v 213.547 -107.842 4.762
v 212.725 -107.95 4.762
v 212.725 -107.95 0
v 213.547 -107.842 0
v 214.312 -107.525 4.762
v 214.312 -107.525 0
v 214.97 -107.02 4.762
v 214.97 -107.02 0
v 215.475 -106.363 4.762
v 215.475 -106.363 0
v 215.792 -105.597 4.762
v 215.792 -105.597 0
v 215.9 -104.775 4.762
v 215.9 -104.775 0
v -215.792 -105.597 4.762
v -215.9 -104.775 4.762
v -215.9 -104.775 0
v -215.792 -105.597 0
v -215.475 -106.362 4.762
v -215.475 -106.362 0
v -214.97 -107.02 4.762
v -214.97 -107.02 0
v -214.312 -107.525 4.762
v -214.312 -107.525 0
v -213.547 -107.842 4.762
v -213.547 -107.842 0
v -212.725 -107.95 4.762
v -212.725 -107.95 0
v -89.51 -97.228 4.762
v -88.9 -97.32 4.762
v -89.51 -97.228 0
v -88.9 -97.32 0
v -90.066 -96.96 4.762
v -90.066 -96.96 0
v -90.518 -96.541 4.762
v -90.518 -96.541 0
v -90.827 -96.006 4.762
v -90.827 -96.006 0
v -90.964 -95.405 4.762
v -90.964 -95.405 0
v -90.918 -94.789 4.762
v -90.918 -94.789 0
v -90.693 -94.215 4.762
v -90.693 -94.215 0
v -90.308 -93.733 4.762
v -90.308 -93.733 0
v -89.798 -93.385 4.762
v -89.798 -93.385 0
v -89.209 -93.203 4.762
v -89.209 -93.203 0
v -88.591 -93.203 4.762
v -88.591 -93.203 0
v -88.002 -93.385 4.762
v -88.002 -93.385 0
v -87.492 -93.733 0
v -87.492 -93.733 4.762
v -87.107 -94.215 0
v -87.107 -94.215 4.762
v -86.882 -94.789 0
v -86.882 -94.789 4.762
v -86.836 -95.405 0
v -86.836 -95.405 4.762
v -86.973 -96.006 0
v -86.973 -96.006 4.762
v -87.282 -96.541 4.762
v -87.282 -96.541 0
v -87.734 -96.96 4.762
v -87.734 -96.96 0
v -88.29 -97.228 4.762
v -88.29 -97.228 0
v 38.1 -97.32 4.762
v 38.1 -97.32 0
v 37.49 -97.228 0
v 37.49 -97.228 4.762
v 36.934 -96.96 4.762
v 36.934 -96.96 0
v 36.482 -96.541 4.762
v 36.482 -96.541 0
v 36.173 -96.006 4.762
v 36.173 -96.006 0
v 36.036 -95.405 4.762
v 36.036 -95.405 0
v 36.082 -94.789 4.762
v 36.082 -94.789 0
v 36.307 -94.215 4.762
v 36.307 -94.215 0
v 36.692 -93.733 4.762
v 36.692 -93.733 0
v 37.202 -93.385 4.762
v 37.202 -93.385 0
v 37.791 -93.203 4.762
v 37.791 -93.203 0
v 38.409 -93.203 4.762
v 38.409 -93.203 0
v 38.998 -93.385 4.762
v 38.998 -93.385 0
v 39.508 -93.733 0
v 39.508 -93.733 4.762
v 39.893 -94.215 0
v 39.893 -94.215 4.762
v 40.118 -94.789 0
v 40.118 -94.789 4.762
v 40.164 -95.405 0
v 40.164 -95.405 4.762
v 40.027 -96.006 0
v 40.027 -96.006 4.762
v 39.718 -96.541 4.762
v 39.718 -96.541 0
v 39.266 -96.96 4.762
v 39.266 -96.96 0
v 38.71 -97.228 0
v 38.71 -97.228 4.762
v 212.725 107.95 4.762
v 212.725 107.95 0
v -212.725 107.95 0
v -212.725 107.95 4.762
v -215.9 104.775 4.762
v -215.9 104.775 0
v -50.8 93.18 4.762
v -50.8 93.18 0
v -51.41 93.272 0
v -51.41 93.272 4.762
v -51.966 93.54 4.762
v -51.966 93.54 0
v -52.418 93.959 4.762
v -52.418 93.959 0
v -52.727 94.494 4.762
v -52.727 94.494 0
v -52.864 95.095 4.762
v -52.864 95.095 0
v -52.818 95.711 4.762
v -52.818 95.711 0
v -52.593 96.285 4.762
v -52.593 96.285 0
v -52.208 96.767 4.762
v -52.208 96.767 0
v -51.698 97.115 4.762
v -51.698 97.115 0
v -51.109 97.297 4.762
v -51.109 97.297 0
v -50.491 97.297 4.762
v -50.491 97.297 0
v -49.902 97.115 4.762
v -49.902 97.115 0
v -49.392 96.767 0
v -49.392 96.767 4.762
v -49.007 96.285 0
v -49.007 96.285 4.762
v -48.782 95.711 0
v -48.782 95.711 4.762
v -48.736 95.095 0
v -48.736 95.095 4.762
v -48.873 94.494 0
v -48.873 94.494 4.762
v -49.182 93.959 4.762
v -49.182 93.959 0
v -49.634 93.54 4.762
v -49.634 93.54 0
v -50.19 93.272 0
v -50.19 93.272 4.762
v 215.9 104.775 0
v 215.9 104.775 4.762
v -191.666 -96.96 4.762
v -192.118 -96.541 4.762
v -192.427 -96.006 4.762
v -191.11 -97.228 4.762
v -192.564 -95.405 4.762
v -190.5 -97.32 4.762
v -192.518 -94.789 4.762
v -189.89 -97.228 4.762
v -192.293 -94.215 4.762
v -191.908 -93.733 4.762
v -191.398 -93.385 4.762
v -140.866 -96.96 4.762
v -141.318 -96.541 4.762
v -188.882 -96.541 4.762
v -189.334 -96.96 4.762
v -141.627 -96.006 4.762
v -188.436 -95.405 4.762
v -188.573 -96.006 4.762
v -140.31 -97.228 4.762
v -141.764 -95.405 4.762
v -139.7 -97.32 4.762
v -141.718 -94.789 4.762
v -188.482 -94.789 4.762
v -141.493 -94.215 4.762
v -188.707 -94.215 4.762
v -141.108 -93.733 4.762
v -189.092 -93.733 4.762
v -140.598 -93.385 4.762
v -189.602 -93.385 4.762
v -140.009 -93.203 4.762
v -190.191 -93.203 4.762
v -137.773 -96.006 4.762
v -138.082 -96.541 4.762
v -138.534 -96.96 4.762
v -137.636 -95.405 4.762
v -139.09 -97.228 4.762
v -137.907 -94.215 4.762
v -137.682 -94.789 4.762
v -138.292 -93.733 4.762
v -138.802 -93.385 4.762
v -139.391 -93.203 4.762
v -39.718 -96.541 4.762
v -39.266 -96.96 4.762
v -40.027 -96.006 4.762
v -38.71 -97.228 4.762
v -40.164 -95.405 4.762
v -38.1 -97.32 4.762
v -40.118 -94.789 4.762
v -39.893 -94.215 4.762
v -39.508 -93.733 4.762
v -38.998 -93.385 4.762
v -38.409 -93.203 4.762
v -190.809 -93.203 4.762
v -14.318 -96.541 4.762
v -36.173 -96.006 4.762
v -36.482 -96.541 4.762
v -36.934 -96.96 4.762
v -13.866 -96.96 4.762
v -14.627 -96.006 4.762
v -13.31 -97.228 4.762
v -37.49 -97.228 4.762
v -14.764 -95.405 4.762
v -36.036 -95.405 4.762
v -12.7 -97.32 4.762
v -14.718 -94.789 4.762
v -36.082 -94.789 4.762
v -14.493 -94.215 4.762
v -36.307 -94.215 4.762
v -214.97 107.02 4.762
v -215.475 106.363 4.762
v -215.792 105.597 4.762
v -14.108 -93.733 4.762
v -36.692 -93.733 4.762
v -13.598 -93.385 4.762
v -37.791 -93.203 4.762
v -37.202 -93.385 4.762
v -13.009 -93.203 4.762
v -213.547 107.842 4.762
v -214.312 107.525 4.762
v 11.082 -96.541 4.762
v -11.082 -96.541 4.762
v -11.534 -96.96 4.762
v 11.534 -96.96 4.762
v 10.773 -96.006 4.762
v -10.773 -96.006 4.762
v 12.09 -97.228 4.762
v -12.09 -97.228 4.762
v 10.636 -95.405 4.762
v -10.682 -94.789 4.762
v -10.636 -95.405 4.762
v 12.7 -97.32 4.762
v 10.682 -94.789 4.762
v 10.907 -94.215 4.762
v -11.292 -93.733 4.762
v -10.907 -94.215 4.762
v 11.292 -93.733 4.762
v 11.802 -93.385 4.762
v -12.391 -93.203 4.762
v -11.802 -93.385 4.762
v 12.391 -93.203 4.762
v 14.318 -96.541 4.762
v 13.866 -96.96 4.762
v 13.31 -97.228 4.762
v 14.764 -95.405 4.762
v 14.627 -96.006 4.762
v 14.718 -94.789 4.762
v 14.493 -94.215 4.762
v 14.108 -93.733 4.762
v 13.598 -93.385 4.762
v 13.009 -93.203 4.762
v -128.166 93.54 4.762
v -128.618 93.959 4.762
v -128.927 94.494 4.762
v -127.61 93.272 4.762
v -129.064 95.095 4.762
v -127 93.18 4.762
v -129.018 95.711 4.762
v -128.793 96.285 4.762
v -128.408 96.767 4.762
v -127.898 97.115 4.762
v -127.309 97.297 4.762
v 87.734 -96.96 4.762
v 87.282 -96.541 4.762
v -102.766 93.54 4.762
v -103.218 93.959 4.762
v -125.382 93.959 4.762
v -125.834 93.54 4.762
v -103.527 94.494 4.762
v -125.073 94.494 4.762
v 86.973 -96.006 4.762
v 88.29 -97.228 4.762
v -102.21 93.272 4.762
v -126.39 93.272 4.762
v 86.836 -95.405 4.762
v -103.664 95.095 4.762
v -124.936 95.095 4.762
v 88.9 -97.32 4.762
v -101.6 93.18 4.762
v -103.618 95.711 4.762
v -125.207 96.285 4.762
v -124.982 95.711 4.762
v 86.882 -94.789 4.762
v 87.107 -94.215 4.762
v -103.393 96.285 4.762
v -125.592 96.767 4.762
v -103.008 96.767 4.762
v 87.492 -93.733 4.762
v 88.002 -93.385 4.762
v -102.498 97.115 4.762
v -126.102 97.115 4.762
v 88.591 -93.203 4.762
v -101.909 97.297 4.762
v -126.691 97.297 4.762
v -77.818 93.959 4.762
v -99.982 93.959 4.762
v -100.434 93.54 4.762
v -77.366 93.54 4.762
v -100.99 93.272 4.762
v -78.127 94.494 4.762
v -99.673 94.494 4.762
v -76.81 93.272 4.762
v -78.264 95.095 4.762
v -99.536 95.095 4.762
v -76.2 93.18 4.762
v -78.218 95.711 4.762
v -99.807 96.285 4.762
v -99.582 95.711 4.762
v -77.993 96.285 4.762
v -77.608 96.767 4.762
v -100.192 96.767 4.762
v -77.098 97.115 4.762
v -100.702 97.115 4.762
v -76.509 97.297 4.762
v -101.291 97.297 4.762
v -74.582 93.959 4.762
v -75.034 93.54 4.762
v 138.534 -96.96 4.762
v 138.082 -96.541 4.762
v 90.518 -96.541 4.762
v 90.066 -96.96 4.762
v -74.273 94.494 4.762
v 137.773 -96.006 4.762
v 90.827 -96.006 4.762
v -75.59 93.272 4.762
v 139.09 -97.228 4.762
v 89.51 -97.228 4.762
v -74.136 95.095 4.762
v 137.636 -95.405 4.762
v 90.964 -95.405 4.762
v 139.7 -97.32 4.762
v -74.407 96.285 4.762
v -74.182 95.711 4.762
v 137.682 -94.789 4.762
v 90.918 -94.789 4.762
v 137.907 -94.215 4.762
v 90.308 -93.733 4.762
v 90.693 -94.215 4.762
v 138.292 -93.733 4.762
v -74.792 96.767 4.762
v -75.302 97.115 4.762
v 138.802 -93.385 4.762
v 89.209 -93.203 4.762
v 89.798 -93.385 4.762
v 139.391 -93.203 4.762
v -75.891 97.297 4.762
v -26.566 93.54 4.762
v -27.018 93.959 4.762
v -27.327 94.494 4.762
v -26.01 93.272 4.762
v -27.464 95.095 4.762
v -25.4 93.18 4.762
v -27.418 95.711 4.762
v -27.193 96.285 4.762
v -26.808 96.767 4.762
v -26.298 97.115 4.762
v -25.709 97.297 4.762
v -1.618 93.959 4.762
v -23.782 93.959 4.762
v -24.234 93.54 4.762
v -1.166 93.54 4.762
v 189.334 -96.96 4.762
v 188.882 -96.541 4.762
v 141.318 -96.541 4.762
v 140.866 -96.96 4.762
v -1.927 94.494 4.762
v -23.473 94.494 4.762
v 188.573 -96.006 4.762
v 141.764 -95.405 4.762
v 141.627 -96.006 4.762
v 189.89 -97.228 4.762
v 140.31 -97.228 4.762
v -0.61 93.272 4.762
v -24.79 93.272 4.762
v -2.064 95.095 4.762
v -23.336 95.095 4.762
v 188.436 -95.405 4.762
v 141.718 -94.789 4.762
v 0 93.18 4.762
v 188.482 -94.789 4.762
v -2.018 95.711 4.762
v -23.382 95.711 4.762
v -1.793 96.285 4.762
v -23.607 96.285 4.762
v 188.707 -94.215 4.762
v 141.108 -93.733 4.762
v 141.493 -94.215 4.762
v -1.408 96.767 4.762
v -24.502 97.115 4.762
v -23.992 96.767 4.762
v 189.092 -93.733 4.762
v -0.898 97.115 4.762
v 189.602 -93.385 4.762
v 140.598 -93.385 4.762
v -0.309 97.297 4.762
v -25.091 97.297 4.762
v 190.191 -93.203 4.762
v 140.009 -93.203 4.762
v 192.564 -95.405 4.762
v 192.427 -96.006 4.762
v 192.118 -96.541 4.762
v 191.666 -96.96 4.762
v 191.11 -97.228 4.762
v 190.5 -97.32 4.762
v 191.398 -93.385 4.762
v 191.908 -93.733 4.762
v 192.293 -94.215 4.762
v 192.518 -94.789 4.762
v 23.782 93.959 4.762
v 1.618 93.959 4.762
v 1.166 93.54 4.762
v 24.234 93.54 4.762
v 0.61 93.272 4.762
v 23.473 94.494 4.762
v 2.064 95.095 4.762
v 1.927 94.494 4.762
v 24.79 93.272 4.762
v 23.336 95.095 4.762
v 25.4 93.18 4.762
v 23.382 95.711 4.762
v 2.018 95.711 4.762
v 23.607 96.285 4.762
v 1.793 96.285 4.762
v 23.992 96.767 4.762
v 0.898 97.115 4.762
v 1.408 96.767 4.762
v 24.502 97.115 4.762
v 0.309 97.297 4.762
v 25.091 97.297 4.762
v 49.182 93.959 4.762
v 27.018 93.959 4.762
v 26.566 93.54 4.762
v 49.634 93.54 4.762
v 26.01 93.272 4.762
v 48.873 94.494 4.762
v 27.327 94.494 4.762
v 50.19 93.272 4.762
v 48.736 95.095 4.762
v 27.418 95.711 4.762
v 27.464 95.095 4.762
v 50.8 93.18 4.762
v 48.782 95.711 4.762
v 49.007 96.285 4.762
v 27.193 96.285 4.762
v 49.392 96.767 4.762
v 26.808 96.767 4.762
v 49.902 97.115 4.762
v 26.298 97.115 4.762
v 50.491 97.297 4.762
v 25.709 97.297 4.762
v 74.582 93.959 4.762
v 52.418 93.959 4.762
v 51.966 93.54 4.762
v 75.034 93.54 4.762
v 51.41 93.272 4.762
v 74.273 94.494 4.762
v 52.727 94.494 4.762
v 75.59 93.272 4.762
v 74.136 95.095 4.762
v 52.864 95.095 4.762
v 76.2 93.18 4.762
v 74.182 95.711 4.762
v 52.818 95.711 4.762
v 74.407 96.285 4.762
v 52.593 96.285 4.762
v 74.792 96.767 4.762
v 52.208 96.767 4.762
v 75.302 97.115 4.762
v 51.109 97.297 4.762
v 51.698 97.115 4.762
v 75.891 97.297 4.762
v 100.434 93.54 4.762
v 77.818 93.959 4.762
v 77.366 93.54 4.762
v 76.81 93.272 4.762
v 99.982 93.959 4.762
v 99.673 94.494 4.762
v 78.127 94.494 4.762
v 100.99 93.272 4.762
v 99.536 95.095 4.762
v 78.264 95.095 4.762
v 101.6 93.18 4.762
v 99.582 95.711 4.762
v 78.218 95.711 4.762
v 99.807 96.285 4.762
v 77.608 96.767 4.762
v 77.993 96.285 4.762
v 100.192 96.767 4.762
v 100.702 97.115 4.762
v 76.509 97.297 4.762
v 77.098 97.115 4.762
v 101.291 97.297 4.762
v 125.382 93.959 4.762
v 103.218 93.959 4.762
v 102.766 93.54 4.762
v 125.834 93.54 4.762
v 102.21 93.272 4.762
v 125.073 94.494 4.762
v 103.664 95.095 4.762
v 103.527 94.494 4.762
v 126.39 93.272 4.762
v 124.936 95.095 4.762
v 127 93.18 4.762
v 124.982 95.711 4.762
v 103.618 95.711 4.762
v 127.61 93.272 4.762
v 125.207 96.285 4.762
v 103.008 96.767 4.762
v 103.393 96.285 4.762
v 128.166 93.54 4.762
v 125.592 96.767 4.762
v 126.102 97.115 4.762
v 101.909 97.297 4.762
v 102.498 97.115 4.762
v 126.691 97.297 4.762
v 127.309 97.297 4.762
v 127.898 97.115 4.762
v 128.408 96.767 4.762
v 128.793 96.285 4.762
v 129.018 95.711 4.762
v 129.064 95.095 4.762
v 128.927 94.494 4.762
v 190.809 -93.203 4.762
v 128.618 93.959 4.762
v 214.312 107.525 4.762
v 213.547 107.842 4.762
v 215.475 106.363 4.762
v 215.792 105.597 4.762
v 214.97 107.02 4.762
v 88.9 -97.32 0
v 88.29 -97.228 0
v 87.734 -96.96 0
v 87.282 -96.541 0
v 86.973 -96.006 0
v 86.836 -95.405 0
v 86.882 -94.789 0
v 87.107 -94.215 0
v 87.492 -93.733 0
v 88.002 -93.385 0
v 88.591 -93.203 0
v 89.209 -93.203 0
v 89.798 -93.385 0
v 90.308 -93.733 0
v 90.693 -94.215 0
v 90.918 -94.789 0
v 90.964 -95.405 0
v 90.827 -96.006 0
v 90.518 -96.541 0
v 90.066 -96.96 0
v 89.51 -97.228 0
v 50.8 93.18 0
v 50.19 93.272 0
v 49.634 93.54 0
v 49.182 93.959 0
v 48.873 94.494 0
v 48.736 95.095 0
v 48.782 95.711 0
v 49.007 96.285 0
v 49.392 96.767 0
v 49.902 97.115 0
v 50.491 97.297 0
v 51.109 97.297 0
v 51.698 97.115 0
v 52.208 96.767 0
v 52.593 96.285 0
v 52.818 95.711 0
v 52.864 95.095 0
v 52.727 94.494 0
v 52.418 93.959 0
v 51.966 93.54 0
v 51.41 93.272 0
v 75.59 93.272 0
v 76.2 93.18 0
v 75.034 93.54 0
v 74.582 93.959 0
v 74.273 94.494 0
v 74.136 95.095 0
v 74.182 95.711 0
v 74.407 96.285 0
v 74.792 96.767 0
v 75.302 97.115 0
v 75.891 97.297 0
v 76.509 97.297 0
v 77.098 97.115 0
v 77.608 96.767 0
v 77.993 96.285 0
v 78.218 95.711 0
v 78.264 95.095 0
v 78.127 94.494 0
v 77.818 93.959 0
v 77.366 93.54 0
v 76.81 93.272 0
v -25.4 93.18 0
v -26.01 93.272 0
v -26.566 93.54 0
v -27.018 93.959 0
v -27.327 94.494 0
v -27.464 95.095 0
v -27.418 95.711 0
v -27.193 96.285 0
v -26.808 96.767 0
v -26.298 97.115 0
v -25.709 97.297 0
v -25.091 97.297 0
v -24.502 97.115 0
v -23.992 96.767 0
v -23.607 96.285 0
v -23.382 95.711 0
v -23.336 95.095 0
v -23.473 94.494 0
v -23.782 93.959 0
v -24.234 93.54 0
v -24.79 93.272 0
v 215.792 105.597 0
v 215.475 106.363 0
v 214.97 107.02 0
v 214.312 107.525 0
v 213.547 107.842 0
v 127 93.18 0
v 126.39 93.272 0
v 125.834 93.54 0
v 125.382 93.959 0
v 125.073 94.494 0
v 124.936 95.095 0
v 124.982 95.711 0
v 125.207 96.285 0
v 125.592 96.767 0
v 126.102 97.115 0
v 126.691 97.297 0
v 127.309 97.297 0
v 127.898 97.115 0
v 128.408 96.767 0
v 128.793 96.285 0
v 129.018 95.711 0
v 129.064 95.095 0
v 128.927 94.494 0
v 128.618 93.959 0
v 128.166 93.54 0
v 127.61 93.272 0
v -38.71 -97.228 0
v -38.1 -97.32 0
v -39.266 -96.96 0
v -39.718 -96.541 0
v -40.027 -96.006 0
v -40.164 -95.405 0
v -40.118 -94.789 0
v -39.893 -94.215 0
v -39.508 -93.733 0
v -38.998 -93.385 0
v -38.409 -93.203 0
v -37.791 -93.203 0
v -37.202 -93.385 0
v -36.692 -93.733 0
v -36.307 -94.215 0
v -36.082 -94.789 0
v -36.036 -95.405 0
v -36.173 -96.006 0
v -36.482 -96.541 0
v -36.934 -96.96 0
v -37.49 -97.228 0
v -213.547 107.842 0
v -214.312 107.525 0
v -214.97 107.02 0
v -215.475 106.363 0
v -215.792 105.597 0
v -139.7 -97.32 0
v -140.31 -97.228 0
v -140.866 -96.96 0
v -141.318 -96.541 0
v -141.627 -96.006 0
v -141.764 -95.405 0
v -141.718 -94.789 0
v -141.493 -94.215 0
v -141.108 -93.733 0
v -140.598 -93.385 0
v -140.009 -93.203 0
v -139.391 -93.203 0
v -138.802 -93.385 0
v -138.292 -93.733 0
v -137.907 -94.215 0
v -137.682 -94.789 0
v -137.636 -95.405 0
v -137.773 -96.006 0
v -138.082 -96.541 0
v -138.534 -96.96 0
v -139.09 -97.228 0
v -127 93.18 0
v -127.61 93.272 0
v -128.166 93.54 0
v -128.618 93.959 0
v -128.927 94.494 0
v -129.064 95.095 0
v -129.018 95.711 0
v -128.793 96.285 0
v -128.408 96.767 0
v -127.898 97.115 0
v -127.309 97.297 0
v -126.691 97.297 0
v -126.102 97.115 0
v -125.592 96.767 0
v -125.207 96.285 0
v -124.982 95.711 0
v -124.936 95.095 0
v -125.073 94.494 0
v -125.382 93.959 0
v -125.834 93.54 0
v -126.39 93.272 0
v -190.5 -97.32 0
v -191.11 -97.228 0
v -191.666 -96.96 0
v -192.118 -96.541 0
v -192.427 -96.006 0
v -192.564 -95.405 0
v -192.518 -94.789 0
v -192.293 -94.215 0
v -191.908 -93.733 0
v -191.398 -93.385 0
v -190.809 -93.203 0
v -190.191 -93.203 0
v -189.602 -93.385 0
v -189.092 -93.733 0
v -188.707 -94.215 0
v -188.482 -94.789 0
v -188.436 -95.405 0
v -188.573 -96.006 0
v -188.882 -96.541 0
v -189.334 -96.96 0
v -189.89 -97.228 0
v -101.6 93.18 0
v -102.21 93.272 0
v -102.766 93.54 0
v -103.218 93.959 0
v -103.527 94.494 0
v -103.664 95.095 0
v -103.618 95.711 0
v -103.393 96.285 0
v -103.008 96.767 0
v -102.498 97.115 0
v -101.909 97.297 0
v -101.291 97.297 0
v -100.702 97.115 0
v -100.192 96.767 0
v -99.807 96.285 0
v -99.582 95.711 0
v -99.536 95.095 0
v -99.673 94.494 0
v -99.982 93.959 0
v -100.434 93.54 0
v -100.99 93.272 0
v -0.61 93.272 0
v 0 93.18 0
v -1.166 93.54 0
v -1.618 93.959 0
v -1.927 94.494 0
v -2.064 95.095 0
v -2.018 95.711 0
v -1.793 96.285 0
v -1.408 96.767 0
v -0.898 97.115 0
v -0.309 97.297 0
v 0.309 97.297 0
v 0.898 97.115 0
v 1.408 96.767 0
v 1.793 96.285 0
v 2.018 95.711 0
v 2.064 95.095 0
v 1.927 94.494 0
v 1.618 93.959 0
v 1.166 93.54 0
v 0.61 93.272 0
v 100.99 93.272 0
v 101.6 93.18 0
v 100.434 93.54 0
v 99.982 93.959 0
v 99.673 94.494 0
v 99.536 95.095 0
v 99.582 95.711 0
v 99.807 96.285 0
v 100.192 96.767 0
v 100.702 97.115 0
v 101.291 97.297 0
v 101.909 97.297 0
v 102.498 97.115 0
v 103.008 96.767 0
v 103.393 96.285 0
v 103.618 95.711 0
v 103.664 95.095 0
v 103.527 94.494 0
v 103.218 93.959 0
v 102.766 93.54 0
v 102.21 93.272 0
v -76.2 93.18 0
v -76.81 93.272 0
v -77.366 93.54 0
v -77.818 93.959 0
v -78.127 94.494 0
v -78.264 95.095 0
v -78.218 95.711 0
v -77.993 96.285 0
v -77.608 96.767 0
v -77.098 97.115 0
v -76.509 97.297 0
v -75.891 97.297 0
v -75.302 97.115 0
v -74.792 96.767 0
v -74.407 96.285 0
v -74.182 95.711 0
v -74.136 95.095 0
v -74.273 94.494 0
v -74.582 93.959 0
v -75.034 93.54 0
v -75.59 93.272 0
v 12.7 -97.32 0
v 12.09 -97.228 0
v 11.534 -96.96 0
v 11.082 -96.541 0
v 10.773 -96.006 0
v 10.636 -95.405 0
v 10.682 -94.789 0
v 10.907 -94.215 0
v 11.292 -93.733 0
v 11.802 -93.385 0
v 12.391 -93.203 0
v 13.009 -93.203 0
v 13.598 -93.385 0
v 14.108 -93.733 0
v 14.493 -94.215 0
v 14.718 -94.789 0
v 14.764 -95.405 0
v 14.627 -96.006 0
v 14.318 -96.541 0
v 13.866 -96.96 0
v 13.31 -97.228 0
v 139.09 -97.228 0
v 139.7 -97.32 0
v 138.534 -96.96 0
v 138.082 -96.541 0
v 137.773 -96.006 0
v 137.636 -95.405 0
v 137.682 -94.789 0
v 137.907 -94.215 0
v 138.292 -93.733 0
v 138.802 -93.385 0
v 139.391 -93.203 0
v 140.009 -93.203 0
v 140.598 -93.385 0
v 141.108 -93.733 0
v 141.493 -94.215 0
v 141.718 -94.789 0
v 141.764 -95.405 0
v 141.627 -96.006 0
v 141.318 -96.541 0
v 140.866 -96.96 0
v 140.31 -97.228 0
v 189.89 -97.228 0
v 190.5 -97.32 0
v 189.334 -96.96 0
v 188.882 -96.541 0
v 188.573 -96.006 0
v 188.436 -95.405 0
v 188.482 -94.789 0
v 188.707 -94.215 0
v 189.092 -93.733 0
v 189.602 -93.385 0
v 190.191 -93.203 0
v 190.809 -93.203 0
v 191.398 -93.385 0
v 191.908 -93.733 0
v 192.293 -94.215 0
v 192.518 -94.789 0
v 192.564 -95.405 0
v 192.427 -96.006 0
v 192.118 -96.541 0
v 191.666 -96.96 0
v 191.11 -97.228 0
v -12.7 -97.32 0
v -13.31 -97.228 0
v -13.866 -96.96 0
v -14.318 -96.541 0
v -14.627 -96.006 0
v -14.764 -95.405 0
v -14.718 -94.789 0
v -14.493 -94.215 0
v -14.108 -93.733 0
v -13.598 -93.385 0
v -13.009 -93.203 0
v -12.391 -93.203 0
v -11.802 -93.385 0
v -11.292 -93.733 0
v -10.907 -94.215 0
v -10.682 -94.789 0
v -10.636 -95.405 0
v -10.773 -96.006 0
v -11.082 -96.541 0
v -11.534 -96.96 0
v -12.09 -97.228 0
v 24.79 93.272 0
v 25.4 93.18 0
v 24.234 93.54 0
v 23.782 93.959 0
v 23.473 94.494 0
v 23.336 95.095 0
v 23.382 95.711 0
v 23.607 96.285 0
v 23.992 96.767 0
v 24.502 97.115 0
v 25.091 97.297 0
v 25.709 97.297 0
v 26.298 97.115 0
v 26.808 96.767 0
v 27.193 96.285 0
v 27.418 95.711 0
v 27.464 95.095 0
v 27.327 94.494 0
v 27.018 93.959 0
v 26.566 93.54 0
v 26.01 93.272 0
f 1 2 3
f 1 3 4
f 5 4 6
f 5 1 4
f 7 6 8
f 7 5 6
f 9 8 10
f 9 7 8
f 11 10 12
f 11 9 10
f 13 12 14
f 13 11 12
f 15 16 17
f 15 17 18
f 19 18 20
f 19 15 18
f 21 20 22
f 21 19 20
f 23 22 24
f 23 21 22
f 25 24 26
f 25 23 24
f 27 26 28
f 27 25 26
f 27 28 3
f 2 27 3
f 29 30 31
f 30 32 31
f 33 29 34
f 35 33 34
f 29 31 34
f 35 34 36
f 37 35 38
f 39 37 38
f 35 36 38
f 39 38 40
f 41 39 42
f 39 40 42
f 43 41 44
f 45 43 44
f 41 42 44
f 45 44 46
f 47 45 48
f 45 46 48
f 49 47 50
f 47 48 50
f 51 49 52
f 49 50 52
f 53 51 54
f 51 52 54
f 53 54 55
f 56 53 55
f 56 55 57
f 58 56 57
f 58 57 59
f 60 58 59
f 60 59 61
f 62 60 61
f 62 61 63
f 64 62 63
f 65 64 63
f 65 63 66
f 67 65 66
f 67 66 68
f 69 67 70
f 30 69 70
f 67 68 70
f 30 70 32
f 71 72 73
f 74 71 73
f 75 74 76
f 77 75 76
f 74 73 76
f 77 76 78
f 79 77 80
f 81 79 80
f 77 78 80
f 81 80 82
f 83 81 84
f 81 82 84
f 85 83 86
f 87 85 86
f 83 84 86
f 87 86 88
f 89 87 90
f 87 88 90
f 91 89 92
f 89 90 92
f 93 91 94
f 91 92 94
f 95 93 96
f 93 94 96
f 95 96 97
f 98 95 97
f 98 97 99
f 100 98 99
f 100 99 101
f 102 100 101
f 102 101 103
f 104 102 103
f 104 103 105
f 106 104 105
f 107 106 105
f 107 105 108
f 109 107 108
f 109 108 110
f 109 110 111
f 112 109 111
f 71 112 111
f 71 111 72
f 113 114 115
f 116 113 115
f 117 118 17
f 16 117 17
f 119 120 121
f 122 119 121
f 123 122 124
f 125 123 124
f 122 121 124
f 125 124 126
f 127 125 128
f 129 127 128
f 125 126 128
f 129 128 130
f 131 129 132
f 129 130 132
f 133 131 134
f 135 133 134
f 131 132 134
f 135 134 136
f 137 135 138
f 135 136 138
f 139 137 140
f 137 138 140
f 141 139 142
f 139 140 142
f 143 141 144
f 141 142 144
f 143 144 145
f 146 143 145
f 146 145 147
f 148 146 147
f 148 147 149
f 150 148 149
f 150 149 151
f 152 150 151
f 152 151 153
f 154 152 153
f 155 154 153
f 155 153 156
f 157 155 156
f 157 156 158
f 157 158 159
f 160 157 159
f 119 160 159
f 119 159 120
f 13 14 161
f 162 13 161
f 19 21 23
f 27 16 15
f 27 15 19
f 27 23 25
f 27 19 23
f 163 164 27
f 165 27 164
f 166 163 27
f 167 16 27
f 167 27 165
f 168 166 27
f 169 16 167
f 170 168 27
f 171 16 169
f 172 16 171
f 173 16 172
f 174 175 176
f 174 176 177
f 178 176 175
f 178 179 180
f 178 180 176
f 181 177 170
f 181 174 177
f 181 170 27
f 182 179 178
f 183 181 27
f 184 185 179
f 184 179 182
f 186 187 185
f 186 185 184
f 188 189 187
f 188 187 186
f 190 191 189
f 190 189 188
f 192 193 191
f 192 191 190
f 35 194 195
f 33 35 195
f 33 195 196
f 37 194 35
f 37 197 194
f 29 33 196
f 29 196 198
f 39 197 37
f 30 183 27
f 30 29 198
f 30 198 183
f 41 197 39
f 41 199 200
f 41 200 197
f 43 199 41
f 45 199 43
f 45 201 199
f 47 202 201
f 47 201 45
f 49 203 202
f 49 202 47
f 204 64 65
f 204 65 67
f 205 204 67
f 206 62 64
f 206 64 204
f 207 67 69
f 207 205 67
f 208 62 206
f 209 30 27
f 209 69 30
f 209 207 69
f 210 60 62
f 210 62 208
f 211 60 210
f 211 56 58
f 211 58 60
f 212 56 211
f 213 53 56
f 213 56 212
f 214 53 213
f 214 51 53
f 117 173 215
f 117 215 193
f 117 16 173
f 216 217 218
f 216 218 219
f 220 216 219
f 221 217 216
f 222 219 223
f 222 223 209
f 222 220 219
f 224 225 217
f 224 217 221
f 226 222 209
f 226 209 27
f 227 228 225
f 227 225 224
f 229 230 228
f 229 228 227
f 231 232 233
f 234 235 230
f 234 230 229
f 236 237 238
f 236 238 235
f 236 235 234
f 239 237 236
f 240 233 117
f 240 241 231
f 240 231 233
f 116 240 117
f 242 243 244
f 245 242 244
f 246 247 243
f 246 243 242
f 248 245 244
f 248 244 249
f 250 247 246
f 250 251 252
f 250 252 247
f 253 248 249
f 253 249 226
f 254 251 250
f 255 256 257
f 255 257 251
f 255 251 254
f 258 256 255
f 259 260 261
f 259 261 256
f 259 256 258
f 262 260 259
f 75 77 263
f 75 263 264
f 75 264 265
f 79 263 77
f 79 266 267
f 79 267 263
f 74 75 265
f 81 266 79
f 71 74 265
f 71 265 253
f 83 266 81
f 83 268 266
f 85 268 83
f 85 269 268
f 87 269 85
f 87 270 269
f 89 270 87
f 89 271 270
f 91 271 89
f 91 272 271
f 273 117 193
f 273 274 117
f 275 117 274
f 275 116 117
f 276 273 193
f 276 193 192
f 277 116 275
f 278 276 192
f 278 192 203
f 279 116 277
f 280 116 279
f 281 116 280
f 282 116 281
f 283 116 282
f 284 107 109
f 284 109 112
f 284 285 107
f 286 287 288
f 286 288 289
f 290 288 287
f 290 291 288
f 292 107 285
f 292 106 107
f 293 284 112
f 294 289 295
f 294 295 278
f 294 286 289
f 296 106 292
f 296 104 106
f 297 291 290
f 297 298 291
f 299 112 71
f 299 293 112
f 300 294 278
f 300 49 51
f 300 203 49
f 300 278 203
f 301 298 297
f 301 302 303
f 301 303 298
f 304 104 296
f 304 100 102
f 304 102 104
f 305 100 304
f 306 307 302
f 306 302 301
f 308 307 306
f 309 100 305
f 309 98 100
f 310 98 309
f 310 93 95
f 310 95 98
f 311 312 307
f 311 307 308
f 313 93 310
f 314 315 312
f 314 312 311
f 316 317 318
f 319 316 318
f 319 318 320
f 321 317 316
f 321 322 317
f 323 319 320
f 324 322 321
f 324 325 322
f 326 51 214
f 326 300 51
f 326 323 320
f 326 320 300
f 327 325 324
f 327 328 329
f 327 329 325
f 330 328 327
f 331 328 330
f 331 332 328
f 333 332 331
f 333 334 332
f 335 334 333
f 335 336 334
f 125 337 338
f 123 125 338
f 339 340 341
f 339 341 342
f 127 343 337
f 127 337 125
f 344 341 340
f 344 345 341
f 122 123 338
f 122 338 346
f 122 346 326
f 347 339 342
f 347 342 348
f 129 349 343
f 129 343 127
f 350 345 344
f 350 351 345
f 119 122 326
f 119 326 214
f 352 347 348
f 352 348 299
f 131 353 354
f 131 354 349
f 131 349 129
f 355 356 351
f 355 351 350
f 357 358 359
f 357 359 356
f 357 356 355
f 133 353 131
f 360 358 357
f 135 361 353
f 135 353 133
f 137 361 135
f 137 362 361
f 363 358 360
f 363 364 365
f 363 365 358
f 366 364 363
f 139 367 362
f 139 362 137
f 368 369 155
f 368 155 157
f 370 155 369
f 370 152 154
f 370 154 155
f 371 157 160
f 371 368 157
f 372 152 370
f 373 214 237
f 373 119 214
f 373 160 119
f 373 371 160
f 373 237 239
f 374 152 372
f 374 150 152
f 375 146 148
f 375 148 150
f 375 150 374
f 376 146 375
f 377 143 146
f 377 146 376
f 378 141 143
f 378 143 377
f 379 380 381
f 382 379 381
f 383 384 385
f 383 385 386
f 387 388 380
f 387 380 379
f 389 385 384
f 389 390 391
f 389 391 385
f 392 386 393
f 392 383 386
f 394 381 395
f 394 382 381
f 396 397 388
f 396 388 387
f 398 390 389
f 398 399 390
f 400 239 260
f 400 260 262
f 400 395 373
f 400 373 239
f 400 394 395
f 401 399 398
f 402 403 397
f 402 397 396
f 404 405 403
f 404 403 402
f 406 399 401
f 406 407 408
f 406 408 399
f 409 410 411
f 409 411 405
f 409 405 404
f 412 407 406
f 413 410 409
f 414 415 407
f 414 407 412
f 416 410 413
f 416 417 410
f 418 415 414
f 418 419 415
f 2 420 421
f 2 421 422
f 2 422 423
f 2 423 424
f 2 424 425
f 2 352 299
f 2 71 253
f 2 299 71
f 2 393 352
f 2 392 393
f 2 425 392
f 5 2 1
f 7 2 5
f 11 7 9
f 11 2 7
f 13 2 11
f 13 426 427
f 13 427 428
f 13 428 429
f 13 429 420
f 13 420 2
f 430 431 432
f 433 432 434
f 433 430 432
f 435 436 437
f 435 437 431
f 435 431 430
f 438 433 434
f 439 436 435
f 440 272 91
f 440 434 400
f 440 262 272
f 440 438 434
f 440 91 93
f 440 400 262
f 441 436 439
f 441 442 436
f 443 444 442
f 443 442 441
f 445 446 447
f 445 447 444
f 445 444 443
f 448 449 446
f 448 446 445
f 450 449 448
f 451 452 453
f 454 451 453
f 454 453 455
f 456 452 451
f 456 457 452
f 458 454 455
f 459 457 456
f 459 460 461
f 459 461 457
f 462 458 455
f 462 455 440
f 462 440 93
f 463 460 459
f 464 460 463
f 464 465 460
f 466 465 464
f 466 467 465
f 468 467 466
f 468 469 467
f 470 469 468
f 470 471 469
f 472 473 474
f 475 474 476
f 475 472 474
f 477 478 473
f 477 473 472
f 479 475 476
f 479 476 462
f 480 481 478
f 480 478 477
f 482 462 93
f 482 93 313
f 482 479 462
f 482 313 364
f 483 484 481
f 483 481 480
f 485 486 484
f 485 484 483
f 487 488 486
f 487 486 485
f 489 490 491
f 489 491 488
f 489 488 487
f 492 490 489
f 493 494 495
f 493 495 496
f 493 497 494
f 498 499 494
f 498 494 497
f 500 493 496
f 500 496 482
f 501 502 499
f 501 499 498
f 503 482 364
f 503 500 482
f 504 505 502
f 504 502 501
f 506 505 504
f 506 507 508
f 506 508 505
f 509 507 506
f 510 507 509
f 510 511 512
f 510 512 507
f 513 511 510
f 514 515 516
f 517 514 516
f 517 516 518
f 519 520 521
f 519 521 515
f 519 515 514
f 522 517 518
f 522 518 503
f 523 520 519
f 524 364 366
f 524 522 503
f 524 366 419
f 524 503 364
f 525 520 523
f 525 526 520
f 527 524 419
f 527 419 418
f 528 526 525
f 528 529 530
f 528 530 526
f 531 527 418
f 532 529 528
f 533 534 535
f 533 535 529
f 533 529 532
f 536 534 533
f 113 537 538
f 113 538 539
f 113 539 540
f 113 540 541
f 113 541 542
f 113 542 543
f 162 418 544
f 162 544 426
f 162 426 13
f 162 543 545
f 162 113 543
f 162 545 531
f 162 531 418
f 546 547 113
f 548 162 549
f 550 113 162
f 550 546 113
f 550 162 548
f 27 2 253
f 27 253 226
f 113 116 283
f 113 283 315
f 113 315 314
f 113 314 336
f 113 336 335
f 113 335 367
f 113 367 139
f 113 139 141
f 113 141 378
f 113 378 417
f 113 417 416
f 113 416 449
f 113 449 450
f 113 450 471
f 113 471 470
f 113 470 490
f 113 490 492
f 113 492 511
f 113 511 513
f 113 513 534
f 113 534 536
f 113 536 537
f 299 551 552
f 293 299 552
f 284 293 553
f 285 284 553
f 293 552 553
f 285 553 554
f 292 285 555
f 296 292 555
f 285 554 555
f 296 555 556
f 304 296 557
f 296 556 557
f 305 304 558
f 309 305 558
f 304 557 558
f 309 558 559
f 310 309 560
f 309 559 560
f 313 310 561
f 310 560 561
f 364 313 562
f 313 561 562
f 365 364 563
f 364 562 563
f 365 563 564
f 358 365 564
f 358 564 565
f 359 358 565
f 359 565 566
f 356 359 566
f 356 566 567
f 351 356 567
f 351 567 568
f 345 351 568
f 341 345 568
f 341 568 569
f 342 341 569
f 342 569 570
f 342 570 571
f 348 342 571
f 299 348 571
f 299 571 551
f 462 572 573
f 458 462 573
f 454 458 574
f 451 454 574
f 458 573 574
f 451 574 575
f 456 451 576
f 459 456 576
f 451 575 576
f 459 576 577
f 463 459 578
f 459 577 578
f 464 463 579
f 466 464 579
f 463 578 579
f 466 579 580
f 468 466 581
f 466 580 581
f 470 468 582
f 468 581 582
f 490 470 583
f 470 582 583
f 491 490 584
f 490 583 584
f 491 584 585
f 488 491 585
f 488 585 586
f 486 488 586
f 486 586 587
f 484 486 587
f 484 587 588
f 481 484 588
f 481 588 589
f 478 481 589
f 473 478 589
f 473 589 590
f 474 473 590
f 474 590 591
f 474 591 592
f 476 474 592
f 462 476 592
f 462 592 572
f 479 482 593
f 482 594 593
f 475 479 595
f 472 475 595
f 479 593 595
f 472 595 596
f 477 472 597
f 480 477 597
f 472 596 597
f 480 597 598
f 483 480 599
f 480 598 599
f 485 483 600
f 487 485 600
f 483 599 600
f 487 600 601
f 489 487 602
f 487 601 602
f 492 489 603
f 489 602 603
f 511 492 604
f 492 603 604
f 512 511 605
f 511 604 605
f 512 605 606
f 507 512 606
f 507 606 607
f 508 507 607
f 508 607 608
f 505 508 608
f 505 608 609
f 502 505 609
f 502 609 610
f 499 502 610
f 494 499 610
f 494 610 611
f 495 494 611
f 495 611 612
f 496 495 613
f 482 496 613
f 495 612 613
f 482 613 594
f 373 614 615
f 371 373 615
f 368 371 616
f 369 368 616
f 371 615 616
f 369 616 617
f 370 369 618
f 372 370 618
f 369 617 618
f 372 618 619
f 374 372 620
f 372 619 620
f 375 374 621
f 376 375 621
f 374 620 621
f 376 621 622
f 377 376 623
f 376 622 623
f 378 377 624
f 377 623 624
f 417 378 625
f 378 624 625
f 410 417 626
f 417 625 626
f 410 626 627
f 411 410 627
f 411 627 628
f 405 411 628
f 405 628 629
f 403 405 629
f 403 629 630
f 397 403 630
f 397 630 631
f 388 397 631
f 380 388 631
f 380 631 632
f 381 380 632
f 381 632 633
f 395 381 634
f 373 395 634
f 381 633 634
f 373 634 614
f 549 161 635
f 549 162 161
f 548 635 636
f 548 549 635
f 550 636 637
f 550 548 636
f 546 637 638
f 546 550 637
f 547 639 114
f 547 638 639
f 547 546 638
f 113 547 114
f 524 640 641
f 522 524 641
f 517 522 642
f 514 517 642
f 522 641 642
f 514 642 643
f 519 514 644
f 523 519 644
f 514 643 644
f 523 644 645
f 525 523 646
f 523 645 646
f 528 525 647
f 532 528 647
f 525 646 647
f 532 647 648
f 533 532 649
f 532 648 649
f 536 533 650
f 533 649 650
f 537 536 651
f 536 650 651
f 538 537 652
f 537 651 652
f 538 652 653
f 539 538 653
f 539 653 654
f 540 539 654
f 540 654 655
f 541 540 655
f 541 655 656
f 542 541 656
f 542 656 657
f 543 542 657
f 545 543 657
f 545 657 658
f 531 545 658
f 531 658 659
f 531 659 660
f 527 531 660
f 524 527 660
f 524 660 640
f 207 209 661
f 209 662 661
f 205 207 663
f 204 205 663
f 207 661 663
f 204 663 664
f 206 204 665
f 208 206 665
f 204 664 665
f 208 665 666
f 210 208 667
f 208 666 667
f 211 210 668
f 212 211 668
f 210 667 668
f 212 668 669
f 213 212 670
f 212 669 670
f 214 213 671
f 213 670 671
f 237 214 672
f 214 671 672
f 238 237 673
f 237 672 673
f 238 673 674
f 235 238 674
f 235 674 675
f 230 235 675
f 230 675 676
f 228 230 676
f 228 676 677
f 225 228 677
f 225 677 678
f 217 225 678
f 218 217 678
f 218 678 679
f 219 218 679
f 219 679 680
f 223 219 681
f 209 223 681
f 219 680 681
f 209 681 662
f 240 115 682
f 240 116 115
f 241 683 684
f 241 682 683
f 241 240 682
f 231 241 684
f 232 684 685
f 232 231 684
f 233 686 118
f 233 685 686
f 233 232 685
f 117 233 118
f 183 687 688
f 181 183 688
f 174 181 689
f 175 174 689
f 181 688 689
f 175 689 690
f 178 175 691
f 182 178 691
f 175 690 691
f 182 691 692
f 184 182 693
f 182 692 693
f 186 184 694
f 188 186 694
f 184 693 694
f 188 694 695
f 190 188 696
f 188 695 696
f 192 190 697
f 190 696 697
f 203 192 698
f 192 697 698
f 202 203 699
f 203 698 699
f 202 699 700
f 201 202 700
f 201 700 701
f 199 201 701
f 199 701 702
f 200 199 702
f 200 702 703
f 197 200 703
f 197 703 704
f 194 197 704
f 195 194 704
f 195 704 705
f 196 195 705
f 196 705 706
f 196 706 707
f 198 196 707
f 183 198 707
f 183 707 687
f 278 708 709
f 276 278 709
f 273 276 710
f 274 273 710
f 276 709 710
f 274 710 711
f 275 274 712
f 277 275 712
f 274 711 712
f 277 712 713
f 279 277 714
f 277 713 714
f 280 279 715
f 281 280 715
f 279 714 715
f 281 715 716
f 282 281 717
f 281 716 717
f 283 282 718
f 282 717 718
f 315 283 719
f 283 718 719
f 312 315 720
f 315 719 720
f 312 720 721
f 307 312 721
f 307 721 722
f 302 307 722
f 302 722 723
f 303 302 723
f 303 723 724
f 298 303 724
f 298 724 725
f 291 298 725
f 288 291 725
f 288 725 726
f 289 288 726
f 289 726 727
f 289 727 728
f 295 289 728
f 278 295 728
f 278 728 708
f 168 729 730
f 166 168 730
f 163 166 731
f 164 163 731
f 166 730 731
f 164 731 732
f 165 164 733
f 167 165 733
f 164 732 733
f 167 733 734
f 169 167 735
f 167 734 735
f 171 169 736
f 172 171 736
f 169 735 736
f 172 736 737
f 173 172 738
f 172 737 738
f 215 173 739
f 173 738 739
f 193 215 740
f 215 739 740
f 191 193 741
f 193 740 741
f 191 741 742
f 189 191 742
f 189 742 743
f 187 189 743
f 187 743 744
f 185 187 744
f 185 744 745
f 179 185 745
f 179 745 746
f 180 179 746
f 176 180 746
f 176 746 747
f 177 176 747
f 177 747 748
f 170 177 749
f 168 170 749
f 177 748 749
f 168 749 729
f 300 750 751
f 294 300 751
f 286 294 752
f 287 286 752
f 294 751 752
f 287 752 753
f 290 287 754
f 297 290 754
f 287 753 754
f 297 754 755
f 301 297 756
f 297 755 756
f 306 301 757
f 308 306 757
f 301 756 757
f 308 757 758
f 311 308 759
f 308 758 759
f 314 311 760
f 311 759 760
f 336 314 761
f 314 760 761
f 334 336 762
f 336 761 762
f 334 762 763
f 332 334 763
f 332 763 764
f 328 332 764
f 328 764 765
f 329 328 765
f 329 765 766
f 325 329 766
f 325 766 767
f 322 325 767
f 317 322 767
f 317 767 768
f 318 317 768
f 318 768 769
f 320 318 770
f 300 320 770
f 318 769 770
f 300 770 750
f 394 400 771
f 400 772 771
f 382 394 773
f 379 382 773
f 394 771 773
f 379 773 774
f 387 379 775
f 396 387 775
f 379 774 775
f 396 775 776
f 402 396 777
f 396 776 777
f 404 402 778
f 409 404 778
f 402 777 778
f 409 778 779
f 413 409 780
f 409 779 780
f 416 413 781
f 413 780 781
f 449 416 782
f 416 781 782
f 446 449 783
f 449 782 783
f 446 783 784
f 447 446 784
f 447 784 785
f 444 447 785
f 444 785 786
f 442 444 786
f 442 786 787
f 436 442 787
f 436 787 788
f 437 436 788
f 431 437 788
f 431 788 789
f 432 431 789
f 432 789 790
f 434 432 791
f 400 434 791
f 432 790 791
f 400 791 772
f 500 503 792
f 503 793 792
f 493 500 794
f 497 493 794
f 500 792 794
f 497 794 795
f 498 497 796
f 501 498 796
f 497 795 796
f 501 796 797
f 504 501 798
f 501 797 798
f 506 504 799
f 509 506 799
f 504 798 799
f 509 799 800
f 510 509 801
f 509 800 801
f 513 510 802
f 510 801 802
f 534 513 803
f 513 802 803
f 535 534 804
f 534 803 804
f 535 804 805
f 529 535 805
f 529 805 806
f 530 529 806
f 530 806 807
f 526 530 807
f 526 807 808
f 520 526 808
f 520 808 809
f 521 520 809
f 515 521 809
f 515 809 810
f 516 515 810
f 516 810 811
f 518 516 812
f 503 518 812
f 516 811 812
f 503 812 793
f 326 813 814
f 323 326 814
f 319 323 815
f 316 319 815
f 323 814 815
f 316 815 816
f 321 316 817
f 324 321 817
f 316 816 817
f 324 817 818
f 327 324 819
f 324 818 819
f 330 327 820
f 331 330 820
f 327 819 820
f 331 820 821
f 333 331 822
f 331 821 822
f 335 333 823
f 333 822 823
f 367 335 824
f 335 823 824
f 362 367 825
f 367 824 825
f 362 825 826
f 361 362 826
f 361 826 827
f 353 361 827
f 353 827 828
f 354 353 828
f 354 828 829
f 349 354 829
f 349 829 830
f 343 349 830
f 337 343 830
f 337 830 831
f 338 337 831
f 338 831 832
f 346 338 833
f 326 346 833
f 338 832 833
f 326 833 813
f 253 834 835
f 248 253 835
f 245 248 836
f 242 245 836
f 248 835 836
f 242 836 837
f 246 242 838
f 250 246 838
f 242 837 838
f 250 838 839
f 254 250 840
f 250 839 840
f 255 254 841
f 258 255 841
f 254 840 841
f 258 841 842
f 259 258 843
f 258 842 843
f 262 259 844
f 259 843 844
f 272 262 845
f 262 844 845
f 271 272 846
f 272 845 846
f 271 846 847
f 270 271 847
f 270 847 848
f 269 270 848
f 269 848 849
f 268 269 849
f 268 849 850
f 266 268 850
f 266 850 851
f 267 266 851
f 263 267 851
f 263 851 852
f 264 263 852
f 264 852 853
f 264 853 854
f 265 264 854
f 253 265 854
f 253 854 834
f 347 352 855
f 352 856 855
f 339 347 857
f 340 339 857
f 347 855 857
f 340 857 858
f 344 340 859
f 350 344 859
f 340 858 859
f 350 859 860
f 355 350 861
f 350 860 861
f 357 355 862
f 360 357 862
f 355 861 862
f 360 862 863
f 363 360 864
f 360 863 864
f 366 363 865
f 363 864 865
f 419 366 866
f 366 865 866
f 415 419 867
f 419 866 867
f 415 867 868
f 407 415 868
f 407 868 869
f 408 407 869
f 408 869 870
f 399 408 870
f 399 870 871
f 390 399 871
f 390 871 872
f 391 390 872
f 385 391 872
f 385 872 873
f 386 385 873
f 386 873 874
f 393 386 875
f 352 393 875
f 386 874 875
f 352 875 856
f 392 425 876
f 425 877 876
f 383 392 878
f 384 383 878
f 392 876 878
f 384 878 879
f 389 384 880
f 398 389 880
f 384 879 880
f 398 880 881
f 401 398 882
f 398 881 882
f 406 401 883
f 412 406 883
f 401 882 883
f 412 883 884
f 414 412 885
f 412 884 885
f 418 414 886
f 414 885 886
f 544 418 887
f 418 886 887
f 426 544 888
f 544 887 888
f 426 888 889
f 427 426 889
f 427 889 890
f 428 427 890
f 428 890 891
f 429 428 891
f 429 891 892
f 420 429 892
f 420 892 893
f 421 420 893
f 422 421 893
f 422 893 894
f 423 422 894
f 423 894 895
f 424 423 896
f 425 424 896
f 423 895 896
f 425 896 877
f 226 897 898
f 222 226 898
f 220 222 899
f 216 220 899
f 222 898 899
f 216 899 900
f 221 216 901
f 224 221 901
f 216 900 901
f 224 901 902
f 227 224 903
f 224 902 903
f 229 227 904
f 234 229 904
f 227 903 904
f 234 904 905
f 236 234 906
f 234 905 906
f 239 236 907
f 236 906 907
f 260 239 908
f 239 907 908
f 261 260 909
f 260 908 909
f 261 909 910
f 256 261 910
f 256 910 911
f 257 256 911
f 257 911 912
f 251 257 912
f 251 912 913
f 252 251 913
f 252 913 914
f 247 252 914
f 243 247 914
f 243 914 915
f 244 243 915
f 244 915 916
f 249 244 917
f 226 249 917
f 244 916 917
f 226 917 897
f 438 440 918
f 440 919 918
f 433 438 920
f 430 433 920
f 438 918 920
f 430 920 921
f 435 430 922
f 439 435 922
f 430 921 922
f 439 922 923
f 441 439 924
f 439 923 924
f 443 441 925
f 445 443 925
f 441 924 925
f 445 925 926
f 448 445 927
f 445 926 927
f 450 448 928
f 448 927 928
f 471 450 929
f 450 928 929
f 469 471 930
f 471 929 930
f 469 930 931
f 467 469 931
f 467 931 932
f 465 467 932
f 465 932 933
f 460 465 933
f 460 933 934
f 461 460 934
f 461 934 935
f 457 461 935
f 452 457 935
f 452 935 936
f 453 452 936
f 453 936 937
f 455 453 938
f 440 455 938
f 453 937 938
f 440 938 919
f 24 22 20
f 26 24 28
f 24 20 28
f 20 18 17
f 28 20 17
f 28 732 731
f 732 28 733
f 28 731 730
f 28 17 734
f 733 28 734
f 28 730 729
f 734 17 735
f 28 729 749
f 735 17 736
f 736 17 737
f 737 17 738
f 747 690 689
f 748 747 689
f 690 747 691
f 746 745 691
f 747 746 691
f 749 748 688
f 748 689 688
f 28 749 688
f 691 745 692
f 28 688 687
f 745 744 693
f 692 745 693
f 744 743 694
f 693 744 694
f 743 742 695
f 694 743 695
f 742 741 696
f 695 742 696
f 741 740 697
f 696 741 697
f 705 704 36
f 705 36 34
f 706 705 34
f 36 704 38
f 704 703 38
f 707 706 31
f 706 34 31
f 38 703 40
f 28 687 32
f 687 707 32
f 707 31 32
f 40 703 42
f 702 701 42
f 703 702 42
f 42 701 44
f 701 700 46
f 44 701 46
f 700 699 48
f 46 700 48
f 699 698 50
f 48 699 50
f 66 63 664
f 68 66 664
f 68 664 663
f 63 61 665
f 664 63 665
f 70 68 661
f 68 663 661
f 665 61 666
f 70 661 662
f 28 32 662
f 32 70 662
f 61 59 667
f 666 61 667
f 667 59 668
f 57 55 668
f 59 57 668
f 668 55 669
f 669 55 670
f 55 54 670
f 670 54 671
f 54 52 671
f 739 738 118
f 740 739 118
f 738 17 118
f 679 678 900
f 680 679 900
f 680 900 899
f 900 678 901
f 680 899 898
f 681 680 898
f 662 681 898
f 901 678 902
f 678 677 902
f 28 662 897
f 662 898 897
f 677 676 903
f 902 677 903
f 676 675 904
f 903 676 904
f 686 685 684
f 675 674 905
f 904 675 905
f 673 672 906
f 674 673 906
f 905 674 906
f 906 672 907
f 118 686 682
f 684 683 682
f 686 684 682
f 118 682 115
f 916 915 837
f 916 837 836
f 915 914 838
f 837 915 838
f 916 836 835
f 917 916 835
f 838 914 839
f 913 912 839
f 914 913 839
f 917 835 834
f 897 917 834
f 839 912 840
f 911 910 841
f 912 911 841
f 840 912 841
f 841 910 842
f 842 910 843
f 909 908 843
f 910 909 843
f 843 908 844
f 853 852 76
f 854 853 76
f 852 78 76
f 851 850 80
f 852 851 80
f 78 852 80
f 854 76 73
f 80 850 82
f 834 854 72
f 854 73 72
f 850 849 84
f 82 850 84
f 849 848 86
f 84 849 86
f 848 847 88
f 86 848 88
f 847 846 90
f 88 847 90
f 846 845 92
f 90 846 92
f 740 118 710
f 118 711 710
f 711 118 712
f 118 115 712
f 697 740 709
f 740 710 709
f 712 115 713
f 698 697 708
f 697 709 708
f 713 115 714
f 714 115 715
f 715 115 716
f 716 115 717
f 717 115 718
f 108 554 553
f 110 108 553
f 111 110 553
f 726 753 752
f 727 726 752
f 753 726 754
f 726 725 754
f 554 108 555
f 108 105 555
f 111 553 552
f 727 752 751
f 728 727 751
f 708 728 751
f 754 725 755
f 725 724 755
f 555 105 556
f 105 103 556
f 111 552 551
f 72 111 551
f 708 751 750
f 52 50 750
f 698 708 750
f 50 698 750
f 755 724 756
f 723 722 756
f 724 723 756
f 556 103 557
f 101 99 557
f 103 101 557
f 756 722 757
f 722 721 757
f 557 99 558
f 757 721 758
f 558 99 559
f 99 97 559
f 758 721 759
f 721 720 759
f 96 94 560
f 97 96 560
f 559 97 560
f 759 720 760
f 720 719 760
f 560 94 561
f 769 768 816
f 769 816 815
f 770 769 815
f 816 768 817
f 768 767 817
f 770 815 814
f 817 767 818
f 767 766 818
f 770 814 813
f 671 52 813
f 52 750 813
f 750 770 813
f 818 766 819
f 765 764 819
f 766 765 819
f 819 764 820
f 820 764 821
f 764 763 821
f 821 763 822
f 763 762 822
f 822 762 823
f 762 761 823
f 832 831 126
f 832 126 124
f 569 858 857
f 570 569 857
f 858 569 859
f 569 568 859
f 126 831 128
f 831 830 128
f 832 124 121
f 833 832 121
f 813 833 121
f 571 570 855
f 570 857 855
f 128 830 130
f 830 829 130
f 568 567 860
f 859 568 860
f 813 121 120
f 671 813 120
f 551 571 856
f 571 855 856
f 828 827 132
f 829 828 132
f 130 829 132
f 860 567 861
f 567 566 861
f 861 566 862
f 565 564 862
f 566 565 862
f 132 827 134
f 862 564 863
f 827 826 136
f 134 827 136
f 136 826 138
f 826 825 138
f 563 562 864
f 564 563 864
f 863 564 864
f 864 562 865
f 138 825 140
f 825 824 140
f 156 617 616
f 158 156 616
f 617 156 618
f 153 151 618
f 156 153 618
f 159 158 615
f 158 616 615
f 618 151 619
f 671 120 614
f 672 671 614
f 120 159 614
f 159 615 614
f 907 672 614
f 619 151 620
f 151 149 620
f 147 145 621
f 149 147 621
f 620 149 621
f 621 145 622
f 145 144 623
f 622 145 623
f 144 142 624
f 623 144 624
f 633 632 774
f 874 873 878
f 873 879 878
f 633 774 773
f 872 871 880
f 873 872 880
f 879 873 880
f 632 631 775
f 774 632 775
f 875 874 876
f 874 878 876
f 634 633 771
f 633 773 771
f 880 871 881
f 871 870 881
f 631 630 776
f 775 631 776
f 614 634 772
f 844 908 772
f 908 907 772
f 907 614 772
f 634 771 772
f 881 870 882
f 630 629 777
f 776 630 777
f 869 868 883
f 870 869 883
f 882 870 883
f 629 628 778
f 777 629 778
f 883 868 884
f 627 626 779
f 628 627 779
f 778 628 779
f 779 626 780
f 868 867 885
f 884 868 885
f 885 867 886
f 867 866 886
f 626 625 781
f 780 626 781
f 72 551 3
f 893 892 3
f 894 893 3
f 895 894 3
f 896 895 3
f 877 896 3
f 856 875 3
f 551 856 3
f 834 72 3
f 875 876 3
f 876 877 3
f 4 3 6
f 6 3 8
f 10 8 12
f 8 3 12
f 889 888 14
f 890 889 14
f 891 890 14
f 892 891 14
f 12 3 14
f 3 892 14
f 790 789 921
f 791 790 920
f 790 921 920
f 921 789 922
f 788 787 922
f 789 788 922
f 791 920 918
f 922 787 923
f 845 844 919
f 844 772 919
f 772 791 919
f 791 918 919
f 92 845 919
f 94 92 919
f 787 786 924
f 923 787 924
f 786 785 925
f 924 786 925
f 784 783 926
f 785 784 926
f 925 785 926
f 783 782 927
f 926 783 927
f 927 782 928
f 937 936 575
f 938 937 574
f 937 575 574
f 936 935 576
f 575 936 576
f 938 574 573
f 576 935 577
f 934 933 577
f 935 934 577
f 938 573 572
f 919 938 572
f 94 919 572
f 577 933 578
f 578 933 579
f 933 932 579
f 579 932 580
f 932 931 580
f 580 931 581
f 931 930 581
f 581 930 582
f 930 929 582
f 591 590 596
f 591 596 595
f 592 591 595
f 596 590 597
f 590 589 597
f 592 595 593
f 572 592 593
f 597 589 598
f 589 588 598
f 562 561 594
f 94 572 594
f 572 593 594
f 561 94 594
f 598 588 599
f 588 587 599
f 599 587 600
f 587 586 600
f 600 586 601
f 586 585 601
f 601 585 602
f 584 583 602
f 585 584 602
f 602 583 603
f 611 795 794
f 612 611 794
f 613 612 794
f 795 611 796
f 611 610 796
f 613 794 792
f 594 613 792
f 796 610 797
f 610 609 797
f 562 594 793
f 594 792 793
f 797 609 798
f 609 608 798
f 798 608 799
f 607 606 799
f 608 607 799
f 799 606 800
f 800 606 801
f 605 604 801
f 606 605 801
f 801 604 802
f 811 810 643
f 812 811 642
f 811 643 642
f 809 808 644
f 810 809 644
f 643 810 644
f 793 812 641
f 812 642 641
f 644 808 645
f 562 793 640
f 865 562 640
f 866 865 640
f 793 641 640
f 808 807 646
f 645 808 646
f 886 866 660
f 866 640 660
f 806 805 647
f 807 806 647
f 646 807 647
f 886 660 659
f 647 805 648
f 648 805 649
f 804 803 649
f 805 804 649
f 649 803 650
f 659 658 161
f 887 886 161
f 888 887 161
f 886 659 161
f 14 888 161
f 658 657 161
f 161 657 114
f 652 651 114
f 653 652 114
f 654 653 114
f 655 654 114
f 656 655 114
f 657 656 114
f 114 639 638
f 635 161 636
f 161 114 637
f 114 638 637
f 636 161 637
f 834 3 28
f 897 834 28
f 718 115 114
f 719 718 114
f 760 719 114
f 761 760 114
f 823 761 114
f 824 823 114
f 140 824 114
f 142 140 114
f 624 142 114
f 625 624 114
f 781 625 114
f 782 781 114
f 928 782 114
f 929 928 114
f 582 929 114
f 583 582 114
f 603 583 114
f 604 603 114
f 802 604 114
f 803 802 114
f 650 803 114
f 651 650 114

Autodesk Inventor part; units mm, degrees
ref_plane "YZ Plane" through (0, 0, 0) normal (1, 0, 0) x (0, 1, 0)
ref_plane "XZ Plane" through (0, 0, 0) normal (0, 1, 0) x (-1, 0, 0)
ref_plane "XY Plane" through (0, 0, 0) normal (0, 0, 1) x (1, 0, 0)
sketch "Sketch1" plane through (0, 0, 0) normal (0, 0, 1) x (1, 0, 0)
  line L0 (-215.9, -107.95) -> (215.9, -107.95)
  line L1 (215.9, -107.95) -> (215.9, 107.95)
  line L2 (215.9, 107.95) -> (-215.9, 107.95)
  line L3 (-215.9, 107.95) -> (-215.9, -107.95)
  line L4 (-215.9, -107.95) -> (215.9, 107.95) construction
  line L5 (215.9, -107.95) -> (-215.9, 107.95) construction
  point P0 (0, 0)
  dimension "d0" = 215.9
  dimension "d1" = 431.8
extrude "Extrusion1" add sketch "Sketch1" along normal blind 4.7625
sketch "Sketch2" plane through (0, 0, 4.7625) normal (0, 0, 1) x (1, 0, 0)
  line L0 (215.9, -107.95) -> (215.9, 107.95) projected
  line L1 (215.9, 107.95) -> (-215.9, 107.95) projected
  line L2 (-215.9, -107.95) -> (215.9, -107.95) projected
  point P0 (0, 0)
  point P1 (127, 95.25)
  point P2 (190.5, -95.25)
  point P3 (101.6, 95.25)
  point P4 (76.2, 95.25)
  point P5 (50.8, 95.25)
  point P6 (25.4, 95.25)
  point P7 (0, 95.25)
  point P8 (-25.4, 95.25)
  point P9 (-50.8, 95.25)
  point P10 (-76.2, 95.25)
  point P11 (-101.6, 95.25)
  point P12 (-127, 95.25)
  point P13 (139.7, -95.25)
  point P14 (88.9, -95.25)
  point P15 (38.1, -95.25)
  point P16 (-12.7, -95.25)
  point P17 (12.7, -95.25)
  point P18 (-38.1, -95.25)
  point P19 (-88.9, -95.25)
  point P20 (-139.7, -95.25)
  point P21 (-190.5, -95.25)
  dimension "d12" = 88.9
  dimension "d13" = 12.7
  dimension "d14" = 25.4
  dimension "d15" = 12.7
  dimension "d18" = 25.4
  dimension "d25" = 50.8
  dimension "d30" = 25.4
  dimension "d31" = 12.7
  dimension "d32" = 25.4
  dimension "d33" = 12.7
  dimension "d36" = 50.8
hole "Hole1" at (127, 95.25, 4.7625) at (101.6, 95.25, 4.7625) at (76.2, 95.25, 4.7625) at (50.8, 95.25, 4.7625) at (25.4, 95.25, 4.7625) at (0, 95.25, 4.7625) at (-25.4, 95.25, 4.7625) at (-50.8, 95.25, 4.7625) at (-76.2, 95.25, 4.7625) at (-101.6, 95.25, 4.7625) at (-127, 95.25, 4.7625) at (190.5, -95.25, 4.7625) at (139.7, -95.25, 4.7625) at (88.9, -95.25, 4.7625) at (38.1, -95.25, 4.7625) at (12.7, -95.25, 4.7625) at (-12.7, -95.25, 4.7625) at (-38.1, -95.25, 4.7625) at (-88.9, -95.25, 4.7625) at (-139.7, -95.25, 4.7625) at (-190.5, -95.25, 4.7625) direction (0, 0, -1) diameter 4.1402 end through all
fillet "Fillet1" radius 3.175 4 edges at (215.9, -107.95, 2.3813) (-215.9, -107.95, 2.3813) (-215.9, 107.95, 2.3813) (215.9, 107.95, 2.3813)
properties part number "C16_TK_ElectricBoard" material "Polycarbonate, Clear"
